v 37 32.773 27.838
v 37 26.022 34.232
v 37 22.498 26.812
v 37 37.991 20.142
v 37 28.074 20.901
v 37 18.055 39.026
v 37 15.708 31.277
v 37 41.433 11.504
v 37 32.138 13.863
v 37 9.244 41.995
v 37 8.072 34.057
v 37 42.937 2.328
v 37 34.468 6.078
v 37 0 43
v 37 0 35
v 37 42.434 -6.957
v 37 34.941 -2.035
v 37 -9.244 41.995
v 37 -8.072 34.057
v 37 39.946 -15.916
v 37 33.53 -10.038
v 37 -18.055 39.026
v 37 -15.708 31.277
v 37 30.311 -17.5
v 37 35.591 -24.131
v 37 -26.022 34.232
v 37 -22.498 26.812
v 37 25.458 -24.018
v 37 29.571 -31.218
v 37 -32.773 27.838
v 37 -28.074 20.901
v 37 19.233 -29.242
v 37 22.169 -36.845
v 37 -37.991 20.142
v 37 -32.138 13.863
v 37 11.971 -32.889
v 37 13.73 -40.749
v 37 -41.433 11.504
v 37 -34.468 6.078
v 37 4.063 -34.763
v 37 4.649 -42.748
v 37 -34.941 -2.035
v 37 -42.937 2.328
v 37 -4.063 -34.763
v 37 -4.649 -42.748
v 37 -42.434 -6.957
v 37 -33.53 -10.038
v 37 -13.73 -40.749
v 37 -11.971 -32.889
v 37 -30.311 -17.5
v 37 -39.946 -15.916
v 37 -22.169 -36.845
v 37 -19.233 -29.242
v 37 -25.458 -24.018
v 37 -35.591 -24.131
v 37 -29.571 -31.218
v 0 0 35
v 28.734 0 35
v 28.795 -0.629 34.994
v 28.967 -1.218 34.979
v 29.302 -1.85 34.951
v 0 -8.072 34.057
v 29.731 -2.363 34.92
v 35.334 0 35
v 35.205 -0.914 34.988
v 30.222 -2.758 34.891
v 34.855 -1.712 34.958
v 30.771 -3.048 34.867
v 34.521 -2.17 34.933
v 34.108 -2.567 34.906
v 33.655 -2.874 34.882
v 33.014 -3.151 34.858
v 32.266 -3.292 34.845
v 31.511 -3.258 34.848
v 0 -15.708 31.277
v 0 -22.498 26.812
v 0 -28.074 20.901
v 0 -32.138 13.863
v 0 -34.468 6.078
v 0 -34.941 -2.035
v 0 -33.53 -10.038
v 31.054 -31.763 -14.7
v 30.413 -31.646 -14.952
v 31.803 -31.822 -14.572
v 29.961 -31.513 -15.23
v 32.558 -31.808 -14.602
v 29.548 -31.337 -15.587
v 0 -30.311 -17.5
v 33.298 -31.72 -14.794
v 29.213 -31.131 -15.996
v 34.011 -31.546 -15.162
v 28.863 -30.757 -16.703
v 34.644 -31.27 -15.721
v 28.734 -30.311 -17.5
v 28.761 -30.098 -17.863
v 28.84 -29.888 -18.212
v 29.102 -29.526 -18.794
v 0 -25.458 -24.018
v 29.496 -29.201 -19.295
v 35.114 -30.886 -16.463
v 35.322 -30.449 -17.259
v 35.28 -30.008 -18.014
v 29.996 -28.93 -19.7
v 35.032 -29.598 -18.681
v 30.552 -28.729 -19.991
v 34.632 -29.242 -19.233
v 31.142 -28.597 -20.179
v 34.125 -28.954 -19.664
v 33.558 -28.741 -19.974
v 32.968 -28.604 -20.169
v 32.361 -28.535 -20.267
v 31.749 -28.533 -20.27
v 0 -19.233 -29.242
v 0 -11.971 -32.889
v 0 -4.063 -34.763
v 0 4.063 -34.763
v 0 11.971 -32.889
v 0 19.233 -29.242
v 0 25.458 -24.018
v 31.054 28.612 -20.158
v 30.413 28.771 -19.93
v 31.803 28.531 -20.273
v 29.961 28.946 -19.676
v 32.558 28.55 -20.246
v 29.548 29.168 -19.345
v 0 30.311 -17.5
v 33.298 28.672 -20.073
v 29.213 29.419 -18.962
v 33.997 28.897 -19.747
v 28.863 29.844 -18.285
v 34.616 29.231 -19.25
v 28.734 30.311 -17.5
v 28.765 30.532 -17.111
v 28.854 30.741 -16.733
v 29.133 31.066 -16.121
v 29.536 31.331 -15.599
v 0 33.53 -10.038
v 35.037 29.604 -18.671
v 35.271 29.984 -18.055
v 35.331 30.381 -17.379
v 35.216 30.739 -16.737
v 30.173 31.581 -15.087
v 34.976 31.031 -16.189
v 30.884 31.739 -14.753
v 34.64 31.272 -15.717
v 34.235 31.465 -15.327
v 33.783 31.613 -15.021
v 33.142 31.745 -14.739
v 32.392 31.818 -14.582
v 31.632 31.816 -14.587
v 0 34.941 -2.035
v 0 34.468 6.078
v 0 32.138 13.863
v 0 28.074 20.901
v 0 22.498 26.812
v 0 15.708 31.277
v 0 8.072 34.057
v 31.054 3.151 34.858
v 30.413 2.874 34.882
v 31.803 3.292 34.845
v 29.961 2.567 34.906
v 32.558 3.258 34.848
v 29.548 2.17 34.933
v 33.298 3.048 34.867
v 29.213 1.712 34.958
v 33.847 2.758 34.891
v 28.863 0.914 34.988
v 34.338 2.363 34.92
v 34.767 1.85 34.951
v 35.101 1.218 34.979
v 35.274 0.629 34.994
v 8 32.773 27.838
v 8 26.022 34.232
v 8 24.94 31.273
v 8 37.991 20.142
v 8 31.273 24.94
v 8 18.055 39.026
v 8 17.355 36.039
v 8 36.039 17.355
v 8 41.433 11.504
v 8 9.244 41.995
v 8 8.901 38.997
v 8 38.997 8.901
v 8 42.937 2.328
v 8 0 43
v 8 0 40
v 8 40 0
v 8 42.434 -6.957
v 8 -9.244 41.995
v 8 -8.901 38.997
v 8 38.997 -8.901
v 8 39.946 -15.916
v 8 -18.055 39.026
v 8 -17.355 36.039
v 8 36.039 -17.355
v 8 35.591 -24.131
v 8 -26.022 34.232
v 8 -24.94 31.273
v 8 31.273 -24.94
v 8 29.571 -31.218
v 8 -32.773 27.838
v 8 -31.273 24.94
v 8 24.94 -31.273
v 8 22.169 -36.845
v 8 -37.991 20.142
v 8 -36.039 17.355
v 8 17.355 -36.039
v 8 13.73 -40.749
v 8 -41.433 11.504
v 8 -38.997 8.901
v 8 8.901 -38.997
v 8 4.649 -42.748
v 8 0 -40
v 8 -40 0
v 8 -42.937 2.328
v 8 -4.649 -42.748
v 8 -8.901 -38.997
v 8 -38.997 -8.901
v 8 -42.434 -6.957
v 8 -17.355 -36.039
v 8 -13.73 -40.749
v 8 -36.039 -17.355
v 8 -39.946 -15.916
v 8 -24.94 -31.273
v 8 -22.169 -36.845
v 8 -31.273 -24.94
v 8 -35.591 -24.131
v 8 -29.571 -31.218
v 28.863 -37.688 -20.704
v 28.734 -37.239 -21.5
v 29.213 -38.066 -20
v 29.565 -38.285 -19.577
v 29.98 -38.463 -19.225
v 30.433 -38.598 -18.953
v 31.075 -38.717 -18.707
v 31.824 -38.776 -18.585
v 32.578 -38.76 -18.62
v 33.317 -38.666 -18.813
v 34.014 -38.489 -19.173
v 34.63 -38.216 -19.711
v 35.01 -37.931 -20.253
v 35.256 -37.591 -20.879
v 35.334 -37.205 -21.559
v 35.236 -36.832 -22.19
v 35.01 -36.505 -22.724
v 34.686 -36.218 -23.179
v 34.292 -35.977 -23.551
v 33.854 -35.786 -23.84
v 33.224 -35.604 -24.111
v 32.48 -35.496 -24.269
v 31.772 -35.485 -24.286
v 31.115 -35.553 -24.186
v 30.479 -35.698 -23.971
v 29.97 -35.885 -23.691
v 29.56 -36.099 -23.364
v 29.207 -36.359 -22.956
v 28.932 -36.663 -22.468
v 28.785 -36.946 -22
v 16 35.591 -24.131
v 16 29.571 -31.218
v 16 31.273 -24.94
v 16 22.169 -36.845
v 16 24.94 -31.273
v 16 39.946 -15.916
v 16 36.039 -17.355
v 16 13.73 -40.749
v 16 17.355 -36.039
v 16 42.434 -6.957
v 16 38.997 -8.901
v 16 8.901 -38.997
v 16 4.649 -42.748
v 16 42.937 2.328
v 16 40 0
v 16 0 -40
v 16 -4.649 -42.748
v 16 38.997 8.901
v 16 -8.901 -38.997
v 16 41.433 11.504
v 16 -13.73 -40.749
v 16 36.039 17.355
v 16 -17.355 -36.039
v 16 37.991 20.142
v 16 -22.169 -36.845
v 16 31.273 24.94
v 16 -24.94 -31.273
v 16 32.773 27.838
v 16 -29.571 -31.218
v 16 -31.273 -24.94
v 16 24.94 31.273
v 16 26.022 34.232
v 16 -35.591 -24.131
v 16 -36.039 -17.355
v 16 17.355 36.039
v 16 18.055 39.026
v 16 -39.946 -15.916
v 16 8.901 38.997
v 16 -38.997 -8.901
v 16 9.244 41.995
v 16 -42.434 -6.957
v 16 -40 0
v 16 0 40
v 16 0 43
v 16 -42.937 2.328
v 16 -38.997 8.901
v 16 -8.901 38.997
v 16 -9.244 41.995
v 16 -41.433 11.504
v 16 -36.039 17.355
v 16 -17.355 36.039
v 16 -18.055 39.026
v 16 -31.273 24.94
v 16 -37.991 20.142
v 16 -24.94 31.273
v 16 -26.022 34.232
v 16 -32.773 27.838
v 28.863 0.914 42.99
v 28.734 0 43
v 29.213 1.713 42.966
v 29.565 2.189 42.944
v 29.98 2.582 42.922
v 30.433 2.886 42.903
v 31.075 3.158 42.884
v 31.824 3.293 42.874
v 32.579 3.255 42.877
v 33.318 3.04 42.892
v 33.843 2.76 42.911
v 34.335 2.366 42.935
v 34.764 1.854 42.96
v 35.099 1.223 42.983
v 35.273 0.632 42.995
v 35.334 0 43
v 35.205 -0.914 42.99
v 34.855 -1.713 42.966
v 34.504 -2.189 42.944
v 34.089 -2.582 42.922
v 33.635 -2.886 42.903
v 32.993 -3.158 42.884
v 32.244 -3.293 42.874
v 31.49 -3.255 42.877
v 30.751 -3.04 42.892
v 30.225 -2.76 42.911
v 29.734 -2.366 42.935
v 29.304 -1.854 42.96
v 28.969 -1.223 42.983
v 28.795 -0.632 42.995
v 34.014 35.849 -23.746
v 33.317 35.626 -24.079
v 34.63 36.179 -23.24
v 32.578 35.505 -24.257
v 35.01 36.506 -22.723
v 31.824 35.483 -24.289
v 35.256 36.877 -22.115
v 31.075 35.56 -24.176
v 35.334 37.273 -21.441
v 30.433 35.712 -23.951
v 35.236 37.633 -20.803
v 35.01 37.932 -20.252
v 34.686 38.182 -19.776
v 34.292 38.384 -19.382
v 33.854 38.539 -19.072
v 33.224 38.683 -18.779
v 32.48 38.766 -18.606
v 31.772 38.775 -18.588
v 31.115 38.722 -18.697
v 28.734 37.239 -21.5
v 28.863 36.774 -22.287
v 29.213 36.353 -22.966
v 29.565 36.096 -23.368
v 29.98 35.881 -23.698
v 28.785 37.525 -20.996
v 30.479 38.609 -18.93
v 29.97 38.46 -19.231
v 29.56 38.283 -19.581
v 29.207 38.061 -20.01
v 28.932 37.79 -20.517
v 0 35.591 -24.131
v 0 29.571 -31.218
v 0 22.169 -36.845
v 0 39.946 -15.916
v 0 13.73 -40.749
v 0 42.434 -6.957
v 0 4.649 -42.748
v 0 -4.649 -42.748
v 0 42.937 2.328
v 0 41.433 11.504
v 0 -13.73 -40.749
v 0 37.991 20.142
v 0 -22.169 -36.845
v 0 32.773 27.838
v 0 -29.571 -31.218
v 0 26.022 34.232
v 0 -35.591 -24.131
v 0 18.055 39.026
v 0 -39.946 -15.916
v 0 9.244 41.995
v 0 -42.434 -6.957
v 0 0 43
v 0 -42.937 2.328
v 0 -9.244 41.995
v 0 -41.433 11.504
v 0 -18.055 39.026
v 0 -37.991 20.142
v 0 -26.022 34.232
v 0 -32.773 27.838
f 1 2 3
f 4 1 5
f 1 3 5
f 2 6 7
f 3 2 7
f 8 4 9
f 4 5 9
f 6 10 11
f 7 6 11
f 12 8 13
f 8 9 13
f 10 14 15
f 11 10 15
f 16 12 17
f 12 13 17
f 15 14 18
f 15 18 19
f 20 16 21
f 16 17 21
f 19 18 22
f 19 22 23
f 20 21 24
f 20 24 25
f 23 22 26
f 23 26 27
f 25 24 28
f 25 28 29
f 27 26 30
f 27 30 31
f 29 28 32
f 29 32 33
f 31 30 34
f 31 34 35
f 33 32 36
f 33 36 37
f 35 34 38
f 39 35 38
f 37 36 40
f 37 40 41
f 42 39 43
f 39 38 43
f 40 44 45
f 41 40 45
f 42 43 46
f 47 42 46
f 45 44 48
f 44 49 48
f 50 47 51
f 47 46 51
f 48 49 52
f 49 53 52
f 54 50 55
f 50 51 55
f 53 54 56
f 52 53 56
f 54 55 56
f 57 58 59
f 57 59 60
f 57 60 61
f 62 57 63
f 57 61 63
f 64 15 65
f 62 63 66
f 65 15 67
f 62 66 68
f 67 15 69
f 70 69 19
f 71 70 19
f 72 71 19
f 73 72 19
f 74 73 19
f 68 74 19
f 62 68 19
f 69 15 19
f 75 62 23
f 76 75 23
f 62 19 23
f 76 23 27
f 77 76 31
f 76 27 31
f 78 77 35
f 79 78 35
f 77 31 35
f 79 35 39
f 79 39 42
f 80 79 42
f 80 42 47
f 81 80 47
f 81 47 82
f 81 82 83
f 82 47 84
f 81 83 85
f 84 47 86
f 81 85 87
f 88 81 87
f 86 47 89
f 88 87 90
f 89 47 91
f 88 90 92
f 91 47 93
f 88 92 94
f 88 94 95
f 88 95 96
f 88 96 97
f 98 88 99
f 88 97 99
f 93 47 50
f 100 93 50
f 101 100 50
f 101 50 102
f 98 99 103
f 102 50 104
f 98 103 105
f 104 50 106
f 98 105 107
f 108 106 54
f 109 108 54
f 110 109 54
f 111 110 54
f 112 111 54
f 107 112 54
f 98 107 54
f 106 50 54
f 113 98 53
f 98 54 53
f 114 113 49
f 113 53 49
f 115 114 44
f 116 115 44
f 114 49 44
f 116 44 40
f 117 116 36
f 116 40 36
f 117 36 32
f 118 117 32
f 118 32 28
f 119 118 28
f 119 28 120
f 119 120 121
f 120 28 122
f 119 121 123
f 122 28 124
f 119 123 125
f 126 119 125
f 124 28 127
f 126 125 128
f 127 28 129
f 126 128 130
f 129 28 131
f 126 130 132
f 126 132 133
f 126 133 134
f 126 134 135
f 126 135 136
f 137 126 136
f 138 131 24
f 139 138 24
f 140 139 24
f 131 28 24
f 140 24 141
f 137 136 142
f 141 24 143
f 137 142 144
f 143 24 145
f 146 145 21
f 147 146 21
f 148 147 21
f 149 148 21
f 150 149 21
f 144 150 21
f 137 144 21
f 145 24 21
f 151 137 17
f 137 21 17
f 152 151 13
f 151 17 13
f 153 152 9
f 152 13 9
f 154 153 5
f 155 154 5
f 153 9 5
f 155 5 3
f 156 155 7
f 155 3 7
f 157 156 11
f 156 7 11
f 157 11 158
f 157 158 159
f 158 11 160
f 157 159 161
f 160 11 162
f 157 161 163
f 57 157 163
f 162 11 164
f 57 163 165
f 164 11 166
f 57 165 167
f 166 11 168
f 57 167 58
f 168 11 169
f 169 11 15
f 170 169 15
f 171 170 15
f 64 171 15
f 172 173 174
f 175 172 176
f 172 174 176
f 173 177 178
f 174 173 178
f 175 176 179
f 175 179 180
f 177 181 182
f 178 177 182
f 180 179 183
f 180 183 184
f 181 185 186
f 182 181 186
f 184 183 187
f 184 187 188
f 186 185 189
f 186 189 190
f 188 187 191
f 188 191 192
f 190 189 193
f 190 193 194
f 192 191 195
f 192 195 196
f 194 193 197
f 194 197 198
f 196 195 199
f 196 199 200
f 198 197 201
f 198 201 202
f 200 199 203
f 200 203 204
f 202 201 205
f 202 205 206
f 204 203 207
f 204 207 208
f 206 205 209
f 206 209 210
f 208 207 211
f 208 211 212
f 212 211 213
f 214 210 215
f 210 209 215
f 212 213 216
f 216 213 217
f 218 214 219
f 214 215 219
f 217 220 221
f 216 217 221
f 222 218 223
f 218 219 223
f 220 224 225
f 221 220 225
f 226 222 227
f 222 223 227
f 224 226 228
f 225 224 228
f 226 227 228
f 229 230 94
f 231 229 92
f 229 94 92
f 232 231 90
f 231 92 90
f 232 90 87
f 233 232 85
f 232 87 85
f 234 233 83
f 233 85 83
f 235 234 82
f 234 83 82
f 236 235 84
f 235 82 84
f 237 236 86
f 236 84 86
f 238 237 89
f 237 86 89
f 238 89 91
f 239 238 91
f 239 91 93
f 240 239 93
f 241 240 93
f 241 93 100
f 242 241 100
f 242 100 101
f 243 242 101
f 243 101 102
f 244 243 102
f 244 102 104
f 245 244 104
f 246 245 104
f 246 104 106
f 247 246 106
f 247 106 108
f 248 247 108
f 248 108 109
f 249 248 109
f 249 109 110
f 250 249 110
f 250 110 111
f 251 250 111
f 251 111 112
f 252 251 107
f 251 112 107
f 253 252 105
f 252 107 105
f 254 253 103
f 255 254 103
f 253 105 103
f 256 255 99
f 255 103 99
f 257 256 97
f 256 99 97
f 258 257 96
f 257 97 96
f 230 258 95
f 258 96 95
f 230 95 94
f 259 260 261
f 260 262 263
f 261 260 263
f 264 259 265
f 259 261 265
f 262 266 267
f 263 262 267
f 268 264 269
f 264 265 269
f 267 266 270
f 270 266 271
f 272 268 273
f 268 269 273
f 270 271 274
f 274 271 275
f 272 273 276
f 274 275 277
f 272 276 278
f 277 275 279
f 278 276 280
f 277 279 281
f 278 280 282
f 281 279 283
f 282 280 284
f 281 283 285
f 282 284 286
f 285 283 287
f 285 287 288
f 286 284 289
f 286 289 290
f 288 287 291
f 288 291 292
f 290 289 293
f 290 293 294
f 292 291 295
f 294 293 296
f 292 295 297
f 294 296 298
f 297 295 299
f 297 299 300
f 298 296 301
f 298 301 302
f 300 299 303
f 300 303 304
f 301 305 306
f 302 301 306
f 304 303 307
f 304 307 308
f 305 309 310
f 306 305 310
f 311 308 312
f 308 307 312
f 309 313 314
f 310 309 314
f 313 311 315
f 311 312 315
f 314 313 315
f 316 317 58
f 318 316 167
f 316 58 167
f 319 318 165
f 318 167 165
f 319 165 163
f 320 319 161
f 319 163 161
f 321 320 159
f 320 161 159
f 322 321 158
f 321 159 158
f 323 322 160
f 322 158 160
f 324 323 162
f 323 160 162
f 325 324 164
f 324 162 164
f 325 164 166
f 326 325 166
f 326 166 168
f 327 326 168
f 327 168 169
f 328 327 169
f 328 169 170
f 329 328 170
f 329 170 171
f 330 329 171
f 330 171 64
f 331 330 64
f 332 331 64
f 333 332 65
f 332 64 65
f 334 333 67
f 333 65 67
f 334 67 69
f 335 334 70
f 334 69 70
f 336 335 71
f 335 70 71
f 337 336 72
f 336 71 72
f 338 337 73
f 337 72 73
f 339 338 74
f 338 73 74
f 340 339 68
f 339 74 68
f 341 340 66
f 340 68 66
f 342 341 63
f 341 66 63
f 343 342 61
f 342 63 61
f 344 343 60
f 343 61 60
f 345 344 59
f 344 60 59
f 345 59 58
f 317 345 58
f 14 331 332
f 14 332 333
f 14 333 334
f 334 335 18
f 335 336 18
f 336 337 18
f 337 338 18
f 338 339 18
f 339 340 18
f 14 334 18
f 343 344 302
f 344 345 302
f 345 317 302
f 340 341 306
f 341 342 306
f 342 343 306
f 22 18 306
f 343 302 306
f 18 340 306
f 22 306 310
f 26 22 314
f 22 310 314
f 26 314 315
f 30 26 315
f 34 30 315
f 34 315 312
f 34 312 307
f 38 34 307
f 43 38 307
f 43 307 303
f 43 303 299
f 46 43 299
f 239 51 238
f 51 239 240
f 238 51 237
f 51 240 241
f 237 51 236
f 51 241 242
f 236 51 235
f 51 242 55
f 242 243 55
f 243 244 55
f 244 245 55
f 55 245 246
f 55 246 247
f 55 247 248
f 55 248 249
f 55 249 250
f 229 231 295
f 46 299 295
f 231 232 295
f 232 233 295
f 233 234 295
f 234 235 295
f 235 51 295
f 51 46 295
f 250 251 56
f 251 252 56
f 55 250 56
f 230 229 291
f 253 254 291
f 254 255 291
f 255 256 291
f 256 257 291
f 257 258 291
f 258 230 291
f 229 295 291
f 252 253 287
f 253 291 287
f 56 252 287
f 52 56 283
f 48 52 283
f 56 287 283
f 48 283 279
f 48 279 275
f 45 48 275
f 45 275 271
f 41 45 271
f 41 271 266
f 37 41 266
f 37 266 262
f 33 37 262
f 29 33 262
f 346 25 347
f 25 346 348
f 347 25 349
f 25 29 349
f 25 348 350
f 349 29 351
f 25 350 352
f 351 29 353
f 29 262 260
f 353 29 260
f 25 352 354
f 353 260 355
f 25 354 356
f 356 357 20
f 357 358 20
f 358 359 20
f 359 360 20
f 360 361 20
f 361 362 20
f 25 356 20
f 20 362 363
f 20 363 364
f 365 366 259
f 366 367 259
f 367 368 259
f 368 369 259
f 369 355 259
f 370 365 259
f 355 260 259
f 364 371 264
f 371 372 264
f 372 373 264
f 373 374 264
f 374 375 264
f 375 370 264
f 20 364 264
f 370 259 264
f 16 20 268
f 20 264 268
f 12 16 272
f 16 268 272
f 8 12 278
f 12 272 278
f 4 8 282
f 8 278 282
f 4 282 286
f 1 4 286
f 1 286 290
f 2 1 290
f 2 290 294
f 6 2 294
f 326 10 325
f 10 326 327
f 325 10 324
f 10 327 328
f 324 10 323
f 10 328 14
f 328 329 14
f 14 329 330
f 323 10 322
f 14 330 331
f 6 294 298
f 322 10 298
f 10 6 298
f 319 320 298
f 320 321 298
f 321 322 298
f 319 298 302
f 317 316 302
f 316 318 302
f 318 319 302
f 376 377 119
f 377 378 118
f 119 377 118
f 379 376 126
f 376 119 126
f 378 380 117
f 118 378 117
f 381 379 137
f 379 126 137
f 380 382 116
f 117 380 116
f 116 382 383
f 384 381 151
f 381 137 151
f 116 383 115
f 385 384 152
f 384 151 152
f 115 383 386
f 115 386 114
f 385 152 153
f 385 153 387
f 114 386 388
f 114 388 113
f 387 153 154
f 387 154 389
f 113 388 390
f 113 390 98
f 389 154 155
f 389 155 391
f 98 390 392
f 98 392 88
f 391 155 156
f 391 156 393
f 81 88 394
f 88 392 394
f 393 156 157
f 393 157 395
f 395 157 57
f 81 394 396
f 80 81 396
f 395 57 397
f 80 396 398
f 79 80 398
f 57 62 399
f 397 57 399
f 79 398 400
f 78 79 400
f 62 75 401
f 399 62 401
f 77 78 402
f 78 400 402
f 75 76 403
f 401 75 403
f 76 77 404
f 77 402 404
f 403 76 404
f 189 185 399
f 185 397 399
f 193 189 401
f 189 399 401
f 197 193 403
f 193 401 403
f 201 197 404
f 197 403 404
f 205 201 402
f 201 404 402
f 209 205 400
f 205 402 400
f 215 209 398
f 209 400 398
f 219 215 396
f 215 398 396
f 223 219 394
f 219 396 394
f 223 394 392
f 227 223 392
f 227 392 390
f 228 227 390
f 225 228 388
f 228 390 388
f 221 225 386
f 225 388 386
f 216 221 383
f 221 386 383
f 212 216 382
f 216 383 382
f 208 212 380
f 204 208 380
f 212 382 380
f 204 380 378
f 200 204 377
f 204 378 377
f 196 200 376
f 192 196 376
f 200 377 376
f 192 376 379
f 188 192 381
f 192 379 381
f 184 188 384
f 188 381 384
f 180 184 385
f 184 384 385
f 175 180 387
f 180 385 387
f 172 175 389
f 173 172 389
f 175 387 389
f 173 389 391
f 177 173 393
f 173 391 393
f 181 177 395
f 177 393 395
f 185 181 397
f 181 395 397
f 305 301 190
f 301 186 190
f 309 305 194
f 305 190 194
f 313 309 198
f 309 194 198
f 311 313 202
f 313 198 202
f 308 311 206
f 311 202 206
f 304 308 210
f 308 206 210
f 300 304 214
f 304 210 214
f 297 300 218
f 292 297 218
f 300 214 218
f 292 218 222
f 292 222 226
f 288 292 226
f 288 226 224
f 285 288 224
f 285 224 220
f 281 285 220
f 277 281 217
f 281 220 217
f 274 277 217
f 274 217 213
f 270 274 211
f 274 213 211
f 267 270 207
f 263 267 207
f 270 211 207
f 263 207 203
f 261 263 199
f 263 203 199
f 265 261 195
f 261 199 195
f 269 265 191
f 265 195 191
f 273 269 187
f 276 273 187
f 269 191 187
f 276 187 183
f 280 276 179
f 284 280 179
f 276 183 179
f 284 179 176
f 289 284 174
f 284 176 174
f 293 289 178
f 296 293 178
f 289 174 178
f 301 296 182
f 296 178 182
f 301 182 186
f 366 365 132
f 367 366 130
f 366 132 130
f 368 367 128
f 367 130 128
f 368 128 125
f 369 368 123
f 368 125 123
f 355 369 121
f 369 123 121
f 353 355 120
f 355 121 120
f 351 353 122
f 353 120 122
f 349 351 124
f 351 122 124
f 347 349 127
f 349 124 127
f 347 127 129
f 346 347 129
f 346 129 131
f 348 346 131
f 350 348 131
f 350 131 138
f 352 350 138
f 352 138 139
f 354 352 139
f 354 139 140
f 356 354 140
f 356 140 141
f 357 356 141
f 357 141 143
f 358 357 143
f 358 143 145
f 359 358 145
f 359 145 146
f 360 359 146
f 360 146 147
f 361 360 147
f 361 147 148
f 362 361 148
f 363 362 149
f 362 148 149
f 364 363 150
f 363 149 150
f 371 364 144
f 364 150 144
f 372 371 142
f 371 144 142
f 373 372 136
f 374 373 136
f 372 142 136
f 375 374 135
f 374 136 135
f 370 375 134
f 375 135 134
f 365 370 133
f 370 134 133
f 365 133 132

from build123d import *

# Parameters (mm, degrees)
F5_D            = 6.6
F5_DEPTH        = 15
F5_START        = 0.126815
F5_TIP          = 1.9828400428
F5_COPIES_COUNT = 3


# Not quite as in the source:
# - a pattern or mirror of a feature is missing from the dataset's text; its kind, count and spacing are read off the source's solid


with BuildPart() as f1:
    # F0 (on Front) → F1 (revolve)
    with BuildSketch(Plane.XZ):
        Polygon((0, 43), (0, 35), (37, 35), (37, 43), (16, 43), (16, 40), (8, 40), (8, 43), align=None)
    revolve(axis=Axis((12.3033272102, 0, 0), (1, 0, 0)))

    # F5
    # its depths count from where the whole tool has entered the part; down to there all is cleared
    with Locations(Plane.XY.offset(43).offset(-F5_START)):
        with Locations((32.0342332125, 0)):
            f5 = Hole(F5_D / 2, depth=F5_DEPTH)
            with Locations((0, 0, -(F5_DEPTH + F5_TIP / 2))):  # 118° drill point
                Cone(0, F5_D / 2, F5_TIP, mode=Mode.SUBTRACT)

    # F5_copies: F5 ×3 about axis
    f5_copies_axis = Axis((0, 0, 0), (1, 0, 0))
    for i in range(1, F5_COPIES_COUNT):
        add(f5.rotate(f5_copies_axis, i * 360 / F5_COPIES_COUNT), mode=Mode.SUBTRACT)


solid = f1.part
